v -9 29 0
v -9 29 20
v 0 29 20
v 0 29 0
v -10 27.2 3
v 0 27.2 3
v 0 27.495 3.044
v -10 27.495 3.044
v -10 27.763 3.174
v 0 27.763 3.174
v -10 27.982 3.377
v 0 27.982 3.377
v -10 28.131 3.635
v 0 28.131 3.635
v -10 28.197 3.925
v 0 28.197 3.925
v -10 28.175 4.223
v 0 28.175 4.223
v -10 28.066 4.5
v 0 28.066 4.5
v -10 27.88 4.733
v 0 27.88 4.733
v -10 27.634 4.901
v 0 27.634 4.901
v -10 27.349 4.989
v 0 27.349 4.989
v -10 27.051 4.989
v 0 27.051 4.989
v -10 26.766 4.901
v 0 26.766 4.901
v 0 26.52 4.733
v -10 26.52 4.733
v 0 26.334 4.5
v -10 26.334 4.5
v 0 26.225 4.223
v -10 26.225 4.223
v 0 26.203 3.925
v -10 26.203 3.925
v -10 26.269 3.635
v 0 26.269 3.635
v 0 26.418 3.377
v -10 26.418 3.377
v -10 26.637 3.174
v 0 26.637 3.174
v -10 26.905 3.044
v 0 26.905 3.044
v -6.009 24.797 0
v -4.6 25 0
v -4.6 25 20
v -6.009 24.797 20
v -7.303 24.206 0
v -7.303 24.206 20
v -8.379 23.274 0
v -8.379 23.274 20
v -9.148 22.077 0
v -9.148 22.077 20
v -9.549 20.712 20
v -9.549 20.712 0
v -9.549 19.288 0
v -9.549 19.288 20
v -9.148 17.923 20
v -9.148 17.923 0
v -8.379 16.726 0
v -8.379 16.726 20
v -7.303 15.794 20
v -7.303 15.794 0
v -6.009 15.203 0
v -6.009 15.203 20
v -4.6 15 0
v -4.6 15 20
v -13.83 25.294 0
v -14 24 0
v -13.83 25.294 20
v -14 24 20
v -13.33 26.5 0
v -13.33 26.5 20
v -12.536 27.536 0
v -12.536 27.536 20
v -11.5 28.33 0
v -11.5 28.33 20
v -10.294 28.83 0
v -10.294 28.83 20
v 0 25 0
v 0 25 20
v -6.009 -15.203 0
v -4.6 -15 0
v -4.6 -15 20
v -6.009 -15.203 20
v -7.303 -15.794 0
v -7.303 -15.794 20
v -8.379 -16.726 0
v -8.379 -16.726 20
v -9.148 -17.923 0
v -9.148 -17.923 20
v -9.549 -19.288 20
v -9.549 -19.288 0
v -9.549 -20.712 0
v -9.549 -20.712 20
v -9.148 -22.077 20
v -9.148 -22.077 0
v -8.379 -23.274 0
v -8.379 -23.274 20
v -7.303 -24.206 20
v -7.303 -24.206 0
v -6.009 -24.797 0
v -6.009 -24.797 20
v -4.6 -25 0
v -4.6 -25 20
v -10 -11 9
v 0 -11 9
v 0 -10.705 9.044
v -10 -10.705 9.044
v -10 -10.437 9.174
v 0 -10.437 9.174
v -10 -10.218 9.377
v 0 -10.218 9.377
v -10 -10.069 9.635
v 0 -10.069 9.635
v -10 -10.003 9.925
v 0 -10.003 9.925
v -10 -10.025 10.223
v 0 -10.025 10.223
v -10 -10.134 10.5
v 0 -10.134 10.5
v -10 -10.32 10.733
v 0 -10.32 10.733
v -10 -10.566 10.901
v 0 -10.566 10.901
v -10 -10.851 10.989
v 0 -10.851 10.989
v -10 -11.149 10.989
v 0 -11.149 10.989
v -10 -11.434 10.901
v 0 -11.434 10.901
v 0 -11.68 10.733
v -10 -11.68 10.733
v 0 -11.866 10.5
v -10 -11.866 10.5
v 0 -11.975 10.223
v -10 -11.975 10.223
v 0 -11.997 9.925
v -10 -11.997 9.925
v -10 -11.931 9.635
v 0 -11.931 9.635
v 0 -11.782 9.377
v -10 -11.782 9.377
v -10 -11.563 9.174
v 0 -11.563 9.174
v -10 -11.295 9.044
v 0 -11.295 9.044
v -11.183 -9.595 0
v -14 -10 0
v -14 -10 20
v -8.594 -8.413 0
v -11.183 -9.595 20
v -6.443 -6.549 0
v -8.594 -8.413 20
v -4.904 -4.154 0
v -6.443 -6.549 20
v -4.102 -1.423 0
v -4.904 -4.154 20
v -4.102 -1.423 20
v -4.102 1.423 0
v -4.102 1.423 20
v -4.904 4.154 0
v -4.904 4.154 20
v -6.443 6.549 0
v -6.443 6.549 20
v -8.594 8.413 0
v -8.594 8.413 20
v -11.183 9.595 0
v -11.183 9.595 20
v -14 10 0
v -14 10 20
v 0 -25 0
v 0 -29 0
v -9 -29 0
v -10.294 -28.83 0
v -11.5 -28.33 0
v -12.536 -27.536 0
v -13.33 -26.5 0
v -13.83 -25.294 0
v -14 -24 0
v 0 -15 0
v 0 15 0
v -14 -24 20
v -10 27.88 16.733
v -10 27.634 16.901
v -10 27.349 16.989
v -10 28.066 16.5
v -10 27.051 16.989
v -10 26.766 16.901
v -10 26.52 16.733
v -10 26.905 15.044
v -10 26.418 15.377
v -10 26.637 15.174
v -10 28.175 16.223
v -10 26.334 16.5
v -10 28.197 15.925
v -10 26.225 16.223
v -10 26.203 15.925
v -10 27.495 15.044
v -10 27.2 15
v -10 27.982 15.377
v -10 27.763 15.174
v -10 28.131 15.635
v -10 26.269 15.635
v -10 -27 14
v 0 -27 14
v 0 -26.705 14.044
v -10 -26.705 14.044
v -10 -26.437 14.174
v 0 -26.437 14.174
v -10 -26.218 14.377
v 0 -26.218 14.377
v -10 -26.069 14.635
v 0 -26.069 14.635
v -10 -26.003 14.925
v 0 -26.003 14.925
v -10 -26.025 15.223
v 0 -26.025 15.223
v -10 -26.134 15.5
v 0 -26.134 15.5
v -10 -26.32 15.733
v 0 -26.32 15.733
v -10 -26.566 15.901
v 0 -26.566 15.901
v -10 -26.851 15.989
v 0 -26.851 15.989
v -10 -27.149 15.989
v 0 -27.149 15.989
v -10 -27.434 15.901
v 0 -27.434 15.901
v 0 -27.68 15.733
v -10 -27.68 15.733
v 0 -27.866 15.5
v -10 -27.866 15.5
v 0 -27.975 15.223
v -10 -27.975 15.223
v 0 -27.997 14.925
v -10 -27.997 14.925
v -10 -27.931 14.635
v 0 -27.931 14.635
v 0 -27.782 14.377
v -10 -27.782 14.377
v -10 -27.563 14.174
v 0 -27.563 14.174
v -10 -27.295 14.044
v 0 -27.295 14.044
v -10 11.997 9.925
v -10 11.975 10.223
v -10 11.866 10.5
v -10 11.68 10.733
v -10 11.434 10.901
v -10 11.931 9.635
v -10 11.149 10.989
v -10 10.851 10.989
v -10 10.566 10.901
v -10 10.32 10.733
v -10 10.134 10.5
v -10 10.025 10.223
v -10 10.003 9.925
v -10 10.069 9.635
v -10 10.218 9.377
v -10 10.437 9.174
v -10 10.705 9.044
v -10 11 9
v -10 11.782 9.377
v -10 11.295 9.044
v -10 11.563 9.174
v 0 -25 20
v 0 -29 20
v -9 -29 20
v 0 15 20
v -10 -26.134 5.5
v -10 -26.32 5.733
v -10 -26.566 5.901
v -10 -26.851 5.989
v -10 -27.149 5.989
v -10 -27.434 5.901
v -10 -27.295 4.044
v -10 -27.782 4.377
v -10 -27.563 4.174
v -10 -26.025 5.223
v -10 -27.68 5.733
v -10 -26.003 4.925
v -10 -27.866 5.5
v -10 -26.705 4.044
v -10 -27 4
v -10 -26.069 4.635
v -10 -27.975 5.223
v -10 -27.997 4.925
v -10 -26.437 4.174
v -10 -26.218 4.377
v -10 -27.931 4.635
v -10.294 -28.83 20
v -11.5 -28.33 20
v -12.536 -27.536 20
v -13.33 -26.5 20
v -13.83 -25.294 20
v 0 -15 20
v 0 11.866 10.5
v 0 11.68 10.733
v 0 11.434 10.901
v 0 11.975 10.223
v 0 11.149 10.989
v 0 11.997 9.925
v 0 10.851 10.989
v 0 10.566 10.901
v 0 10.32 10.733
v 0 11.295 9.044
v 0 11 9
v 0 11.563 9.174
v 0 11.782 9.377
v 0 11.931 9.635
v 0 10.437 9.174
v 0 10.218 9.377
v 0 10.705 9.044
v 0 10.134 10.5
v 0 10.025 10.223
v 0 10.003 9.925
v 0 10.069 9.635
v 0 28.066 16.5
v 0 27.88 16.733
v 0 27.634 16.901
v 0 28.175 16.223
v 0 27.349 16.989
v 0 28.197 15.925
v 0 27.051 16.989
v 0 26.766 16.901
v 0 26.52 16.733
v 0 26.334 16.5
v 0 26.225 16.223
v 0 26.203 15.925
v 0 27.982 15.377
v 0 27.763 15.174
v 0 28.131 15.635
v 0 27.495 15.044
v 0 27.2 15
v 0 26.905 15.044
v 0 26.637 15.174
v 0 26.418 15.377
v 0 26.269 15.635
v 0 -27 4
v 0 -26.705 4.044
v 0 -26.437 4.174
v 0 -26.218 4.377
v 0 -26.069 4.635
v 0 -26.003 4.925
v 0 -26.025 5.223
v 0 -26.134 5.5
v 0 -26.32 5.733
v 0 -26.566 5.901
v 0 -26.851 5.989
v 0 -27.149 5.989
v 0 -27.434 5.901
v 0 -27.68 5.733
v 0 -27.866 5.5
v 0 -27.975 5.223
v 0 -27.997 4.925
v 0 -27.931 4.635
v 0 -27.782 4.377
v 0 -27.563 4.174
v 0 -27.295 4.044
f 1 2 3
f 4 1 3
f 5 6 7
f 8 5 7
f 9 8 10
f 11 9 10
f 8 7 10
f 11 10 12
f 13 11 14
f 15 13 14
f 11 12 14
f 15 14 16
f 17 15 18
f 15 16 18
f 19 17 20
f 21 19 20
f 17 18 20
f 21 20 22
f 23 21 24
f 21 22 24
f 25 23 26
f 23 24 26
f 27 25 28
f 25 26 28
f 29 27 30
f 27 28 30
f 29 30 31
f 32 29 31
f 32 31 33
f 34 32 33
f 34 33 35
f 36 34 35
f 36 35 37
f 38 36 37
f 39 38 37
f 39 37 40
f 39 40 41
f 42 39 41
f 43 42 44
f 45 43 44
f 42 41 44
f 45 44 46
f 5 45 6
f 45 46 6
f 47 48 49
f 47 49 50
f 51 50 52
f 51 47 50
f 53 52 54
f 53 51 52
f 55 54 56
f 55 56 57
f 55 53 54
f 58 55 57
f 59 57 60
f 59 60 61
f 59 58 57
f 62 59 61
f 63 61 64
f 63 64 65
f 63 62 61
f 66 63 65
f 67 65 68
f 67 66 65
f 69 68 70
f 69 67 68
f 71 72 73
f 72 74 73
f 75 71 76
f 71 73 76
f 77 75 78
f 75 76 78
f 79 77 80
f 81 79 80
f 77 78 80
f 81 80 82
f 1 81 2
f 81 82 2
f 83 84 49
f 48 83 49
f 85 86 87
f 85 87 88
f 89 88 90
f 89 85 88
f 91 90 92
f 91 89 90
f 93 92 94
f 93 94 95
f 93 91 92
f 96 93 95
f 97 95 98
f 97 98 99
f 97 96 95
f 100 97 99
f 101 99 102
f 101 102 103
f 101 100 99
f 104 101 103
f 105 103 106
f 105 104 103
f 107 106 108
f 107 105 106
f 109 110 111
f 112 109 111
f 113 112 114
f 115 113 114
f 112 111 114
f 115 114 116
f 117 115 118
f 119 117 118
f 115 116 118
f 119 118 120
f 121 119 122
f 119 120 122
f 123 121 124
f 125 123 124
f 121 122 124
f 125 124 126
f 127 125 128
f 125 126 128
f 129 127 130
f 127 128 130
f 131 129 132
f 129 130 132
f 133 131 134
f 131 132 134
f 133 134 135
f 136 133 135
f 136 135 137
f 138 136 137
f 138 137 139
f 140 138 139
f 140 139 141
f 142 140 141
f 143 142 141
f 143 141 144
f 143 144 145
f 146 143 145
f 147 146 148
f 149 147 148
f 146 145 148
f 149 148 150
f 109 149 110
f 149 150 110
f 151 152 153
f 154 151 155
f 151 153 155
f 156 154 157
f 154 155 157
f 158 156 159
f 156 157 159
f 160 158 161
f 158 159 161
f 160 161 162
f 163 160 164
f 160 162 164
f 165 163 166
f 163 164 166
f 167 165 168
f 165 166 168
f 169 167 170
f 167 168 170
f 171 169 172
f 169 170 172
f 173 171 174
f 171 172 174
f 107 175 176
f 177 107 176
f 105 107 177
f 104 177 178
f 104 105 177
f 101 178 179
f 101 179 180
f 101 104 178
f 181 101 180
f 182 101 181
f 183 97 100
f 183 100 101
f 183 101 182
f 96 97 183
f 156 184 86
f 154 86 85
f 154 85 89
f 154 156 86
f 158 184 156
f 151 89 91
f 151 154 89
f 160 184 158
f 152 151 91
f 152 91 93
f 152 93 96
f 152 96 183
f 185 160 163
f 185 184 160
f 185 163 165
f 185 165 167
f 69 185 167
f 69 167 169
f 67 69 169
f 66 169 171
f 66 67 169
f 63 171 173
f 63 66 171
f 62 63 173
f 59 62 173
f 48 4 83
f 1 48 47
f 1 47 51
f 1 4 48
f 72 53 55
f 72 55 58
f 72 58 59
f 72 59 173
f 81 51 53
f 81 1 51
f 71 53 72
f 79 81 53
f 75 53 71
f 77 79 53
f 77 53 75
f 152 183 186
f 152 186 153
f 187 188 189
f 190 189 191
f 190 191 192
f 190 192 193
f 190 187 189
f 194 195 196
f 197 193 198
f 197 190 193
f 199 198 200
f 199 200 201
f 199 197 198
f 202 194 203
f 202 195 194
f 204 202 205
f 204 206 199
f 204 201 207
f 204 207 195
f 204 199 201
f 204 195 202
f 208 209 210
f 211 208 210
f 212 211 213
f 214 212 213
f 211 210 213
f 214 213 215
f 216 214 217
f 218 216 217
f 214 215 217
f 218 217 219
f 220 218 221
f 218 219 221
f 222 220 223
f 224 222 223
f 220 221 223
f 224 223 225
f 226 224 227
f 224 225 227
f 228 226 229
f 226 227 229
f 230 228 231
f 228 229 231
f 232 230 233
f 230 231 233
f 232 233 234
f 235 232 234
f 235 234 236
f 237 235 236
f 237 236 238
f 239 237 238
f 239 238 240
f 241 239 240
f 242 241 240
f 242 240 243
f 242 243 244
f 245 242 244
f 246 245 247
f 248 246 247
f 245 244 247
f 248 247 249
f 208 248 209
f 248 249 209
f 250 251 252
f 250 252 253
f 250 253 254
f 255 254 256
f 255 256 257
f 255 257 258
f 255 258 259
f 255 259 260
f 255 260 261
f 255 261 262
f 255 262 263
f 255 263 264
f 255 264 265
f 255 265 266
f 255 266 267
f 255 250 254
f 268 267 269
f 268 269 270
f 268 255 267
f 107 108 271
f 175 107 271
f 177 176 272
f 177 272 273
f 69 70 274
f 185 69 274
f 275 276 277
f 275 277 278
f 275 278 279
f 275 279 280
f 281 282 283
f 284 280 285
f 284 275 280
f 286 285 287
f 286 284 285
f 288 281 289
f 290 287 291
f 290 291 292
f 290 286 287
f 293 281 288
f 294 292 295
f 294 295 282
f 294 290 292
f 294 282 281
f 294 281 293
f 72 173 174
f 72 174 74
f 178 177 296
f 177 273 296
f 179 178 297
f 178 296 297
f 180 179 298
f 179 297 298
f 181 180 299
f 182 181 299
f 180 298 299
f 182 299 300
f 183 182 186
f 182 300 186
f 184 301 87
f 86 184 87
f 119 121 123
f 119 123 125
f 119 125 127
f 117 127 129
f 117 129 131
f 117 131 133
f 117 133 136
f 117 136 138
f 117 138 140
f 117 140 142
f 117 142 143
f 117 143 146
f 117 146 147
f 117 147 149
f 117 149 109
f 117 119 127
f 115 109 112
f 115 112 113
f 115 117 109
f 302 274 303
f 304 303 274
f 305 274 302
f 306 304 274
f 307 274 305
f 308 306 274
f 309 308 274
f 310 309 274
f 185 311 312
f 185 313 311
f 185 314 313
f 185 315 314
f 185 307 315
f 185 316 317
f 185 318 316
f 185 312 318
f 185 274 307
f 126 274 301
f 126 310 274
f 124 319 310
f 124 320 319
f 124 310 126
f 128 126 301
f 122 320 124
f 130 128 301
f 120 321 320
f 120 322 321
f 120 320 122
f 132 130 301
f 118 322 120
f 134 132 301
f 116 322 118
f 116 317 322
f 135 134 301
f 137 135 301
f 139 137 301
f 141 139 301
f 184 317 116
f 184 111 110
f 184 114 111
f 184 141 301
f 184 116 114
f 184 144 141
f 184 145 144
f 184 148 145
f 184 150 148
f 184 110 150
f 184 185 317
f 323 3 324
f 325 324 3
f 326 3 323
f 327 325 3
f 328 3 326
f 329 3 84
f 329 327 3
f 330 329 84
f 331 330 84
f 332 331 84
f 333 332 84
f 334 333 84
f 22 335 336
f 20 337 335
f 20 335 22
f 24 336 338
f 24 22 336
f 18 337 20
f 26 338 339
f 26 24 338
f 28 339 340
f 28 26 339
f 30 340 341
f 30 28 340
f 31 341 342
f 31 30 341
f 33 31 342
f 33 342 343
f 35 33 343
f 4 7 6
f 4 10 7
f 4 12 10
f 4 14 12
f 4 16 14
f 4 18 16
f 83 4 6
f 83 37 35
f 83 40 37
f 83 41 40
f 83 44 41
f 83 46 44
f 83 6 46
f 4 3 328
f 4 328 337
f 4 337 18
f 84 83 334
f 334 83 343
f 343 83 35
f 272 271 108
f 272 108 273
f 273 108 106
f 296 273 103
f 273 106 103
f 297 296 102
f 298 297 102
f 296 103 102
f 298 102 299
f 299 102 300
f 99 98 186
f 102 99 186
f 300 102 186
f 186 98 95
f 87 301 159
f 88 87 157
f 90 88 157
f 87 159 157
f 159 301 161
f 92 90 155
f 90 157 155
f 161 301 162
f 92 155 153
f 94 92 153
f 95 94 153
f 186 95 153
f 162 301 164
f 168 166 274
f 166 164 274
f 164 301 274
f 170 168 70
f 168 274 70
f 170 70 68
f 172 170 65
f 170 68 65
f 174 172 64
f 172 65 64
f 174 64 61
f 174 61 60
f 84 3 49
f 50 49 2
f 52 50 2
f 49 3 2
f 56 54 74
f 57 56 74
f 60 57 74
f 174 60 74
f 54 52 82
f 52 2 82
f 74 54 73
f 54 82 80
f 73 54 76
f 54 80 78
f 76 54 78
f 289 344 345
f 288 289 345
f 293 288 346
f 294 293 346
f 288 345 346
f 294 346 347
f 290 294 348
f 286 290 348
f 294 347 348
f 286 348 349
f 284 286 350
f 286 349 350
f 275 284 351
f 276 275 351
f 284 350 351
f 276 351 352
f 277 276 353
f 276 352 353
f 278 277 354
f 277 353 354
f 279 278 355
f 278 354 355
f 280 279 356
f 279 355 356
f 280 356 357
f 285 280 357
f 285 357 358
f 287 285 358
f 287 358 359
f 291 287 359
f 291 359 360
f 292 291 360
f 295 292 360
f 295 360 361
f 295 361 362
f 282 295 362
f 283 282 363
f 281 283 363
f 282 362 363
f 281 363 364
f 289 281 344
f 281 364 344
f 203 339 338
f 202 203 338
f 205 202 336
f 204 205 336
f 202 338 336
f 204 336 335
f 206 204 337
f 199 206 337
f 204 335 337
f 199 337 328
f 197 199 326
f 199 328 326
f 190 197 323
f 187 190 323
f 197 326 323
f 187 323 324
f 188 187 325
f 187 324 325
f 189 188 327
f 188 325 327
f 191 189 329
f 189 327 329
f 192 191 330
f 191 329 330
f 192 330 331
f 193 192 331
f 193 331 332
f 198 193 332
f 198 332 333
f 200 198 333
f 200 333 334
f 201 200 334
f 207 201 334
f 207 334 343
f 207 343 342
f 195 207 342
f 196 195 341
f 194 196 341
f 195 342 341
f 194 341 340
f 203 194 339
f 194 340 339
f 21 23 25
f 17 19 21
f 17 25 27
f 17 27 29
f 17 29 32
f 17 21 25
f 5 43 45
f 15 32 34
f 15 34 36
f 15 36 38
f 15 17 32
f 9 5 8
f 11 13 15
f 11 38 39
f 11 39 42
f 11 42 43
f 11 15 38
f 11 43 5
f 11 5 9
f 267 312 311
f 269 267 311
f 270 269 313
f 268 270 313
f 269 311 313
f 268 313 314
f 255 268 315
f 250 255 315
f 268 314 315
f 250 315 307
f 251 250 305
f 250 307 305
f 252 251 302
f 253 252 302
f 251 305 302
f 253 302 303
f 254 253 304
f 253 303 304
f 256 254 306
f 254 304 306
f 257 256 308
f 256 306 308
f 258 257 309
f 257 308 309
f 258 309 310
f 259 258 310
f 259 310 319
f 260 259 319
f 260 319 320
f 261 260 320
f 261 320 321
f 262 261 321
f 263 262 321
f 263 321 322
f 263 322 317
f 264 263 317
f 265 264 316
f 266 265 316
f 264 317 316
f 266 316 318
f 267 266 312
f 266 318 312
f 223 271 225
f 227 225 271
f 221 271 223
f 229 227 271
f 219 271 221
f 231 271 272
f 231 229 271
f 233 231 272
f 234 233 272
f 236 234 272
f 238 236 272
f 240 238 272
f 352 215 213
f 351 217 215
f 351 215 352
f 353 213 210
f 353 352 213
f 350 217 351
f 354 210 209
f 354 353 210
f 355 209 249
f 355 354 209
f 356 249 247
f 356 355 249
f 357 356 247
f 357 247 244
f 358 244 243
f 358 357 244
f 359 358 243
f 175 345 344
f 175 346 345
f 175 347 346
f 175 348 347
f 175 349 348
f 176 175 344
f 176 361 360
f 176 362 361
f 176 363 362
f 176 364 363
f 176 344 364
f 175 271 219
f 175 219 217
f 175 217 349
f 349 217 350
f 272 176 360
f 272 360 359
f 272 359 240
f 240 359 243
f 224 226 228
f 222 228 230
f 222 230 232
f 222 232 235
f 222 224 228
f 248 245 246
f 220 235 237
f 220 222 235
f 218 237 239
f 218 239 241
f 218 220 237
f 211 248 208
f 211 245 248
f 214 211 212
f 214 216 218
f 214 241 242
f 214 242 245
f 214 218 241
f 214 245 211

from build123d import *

# Parameters (mm, degrees)
EXTRUDE_1_DEPTH     = 20
FILLET_1_R          = 5
SKETCH_2_R          = 1
CUT_EXTRUDE_1_DEPTH = 10
SKETCH_3_R          = 10
CUT_EXTRUDE_2_DEPTH = 40


with BuildPart() as part:
    # 草图1 → 凸台-拉伸1 (new body)
    with BuildSketch(Plane.XY):
        with BuildLine():
            Line((0, 29), (0, 25))
            Line((0, 25), (-4.6, 25))
            ThreePointArc((-4.6, 25), (-9.6, 20), (-4.6, 15))
            Line((-4.6, 15), (0, 15))
            Line((0, 15), (0, -15))
            Line((0, -15), (-4.6, -15))
            ThreePointArc((-4.6, -15), (-9.6, -20), (-4.6, -25))
            Line((-4.6, -25), (0, -25))
            Line((0, -25), (0, -29))
            Line((0, -29), (-14, -29))
            Line((-14, -29), (-14, 29))
            Line((-14, 29), (0, 29))
        make_face()
    extrude(amount=EXTRUDE_1_DEPTH)

    # 圆角1
    fillet_1_edges = [part.edges().sort_by_distance(p)[0] for p in [
        (-14, -29, 10),
        (-14, 29, 10),
    ]]
    fillet(fillet_1_edges, radius=FILLET_1_R)

    # 草图2 → 切除-拉伸1 (cut)
    with BuildSketch(Plane(origin=(0, 0, 0), x_dir=(0, 0, -1), z_dir=(1, 0, 0))):
        with Locations((-16, 27.2)):
            Circle(SKETCH_2_R)
        with Locations((-4, 27.2)):
            Circle(SKETCH_2_R)
        with Locations((-10, 11)):
            Circle(SKETCH_2_R)
        with Locations((-10, -11)):
            Circle(SKETCH_2_R)
        with Locations((-15, -27)):
            Circle(SKETCH_2_R)
        with Locations((-5, -27)):
            Circle(SKETCH_2_R)
    extrude(amount=-CUT_EXTRUDE_1_DEPTH, mode=Mode.SUBTRACT)

    # 草图3 → 切除-拉伸2 (cut)
    with BuildSketch(Plane.XY.offset(20)):
        with Locations((-14, 0)):
            Circle(SKETCH_3_R)
    extrude(amount=-CUT_EXTRUDE_2_DEPTH, mode=Mode.SUBTRACT)


solid = part.part
